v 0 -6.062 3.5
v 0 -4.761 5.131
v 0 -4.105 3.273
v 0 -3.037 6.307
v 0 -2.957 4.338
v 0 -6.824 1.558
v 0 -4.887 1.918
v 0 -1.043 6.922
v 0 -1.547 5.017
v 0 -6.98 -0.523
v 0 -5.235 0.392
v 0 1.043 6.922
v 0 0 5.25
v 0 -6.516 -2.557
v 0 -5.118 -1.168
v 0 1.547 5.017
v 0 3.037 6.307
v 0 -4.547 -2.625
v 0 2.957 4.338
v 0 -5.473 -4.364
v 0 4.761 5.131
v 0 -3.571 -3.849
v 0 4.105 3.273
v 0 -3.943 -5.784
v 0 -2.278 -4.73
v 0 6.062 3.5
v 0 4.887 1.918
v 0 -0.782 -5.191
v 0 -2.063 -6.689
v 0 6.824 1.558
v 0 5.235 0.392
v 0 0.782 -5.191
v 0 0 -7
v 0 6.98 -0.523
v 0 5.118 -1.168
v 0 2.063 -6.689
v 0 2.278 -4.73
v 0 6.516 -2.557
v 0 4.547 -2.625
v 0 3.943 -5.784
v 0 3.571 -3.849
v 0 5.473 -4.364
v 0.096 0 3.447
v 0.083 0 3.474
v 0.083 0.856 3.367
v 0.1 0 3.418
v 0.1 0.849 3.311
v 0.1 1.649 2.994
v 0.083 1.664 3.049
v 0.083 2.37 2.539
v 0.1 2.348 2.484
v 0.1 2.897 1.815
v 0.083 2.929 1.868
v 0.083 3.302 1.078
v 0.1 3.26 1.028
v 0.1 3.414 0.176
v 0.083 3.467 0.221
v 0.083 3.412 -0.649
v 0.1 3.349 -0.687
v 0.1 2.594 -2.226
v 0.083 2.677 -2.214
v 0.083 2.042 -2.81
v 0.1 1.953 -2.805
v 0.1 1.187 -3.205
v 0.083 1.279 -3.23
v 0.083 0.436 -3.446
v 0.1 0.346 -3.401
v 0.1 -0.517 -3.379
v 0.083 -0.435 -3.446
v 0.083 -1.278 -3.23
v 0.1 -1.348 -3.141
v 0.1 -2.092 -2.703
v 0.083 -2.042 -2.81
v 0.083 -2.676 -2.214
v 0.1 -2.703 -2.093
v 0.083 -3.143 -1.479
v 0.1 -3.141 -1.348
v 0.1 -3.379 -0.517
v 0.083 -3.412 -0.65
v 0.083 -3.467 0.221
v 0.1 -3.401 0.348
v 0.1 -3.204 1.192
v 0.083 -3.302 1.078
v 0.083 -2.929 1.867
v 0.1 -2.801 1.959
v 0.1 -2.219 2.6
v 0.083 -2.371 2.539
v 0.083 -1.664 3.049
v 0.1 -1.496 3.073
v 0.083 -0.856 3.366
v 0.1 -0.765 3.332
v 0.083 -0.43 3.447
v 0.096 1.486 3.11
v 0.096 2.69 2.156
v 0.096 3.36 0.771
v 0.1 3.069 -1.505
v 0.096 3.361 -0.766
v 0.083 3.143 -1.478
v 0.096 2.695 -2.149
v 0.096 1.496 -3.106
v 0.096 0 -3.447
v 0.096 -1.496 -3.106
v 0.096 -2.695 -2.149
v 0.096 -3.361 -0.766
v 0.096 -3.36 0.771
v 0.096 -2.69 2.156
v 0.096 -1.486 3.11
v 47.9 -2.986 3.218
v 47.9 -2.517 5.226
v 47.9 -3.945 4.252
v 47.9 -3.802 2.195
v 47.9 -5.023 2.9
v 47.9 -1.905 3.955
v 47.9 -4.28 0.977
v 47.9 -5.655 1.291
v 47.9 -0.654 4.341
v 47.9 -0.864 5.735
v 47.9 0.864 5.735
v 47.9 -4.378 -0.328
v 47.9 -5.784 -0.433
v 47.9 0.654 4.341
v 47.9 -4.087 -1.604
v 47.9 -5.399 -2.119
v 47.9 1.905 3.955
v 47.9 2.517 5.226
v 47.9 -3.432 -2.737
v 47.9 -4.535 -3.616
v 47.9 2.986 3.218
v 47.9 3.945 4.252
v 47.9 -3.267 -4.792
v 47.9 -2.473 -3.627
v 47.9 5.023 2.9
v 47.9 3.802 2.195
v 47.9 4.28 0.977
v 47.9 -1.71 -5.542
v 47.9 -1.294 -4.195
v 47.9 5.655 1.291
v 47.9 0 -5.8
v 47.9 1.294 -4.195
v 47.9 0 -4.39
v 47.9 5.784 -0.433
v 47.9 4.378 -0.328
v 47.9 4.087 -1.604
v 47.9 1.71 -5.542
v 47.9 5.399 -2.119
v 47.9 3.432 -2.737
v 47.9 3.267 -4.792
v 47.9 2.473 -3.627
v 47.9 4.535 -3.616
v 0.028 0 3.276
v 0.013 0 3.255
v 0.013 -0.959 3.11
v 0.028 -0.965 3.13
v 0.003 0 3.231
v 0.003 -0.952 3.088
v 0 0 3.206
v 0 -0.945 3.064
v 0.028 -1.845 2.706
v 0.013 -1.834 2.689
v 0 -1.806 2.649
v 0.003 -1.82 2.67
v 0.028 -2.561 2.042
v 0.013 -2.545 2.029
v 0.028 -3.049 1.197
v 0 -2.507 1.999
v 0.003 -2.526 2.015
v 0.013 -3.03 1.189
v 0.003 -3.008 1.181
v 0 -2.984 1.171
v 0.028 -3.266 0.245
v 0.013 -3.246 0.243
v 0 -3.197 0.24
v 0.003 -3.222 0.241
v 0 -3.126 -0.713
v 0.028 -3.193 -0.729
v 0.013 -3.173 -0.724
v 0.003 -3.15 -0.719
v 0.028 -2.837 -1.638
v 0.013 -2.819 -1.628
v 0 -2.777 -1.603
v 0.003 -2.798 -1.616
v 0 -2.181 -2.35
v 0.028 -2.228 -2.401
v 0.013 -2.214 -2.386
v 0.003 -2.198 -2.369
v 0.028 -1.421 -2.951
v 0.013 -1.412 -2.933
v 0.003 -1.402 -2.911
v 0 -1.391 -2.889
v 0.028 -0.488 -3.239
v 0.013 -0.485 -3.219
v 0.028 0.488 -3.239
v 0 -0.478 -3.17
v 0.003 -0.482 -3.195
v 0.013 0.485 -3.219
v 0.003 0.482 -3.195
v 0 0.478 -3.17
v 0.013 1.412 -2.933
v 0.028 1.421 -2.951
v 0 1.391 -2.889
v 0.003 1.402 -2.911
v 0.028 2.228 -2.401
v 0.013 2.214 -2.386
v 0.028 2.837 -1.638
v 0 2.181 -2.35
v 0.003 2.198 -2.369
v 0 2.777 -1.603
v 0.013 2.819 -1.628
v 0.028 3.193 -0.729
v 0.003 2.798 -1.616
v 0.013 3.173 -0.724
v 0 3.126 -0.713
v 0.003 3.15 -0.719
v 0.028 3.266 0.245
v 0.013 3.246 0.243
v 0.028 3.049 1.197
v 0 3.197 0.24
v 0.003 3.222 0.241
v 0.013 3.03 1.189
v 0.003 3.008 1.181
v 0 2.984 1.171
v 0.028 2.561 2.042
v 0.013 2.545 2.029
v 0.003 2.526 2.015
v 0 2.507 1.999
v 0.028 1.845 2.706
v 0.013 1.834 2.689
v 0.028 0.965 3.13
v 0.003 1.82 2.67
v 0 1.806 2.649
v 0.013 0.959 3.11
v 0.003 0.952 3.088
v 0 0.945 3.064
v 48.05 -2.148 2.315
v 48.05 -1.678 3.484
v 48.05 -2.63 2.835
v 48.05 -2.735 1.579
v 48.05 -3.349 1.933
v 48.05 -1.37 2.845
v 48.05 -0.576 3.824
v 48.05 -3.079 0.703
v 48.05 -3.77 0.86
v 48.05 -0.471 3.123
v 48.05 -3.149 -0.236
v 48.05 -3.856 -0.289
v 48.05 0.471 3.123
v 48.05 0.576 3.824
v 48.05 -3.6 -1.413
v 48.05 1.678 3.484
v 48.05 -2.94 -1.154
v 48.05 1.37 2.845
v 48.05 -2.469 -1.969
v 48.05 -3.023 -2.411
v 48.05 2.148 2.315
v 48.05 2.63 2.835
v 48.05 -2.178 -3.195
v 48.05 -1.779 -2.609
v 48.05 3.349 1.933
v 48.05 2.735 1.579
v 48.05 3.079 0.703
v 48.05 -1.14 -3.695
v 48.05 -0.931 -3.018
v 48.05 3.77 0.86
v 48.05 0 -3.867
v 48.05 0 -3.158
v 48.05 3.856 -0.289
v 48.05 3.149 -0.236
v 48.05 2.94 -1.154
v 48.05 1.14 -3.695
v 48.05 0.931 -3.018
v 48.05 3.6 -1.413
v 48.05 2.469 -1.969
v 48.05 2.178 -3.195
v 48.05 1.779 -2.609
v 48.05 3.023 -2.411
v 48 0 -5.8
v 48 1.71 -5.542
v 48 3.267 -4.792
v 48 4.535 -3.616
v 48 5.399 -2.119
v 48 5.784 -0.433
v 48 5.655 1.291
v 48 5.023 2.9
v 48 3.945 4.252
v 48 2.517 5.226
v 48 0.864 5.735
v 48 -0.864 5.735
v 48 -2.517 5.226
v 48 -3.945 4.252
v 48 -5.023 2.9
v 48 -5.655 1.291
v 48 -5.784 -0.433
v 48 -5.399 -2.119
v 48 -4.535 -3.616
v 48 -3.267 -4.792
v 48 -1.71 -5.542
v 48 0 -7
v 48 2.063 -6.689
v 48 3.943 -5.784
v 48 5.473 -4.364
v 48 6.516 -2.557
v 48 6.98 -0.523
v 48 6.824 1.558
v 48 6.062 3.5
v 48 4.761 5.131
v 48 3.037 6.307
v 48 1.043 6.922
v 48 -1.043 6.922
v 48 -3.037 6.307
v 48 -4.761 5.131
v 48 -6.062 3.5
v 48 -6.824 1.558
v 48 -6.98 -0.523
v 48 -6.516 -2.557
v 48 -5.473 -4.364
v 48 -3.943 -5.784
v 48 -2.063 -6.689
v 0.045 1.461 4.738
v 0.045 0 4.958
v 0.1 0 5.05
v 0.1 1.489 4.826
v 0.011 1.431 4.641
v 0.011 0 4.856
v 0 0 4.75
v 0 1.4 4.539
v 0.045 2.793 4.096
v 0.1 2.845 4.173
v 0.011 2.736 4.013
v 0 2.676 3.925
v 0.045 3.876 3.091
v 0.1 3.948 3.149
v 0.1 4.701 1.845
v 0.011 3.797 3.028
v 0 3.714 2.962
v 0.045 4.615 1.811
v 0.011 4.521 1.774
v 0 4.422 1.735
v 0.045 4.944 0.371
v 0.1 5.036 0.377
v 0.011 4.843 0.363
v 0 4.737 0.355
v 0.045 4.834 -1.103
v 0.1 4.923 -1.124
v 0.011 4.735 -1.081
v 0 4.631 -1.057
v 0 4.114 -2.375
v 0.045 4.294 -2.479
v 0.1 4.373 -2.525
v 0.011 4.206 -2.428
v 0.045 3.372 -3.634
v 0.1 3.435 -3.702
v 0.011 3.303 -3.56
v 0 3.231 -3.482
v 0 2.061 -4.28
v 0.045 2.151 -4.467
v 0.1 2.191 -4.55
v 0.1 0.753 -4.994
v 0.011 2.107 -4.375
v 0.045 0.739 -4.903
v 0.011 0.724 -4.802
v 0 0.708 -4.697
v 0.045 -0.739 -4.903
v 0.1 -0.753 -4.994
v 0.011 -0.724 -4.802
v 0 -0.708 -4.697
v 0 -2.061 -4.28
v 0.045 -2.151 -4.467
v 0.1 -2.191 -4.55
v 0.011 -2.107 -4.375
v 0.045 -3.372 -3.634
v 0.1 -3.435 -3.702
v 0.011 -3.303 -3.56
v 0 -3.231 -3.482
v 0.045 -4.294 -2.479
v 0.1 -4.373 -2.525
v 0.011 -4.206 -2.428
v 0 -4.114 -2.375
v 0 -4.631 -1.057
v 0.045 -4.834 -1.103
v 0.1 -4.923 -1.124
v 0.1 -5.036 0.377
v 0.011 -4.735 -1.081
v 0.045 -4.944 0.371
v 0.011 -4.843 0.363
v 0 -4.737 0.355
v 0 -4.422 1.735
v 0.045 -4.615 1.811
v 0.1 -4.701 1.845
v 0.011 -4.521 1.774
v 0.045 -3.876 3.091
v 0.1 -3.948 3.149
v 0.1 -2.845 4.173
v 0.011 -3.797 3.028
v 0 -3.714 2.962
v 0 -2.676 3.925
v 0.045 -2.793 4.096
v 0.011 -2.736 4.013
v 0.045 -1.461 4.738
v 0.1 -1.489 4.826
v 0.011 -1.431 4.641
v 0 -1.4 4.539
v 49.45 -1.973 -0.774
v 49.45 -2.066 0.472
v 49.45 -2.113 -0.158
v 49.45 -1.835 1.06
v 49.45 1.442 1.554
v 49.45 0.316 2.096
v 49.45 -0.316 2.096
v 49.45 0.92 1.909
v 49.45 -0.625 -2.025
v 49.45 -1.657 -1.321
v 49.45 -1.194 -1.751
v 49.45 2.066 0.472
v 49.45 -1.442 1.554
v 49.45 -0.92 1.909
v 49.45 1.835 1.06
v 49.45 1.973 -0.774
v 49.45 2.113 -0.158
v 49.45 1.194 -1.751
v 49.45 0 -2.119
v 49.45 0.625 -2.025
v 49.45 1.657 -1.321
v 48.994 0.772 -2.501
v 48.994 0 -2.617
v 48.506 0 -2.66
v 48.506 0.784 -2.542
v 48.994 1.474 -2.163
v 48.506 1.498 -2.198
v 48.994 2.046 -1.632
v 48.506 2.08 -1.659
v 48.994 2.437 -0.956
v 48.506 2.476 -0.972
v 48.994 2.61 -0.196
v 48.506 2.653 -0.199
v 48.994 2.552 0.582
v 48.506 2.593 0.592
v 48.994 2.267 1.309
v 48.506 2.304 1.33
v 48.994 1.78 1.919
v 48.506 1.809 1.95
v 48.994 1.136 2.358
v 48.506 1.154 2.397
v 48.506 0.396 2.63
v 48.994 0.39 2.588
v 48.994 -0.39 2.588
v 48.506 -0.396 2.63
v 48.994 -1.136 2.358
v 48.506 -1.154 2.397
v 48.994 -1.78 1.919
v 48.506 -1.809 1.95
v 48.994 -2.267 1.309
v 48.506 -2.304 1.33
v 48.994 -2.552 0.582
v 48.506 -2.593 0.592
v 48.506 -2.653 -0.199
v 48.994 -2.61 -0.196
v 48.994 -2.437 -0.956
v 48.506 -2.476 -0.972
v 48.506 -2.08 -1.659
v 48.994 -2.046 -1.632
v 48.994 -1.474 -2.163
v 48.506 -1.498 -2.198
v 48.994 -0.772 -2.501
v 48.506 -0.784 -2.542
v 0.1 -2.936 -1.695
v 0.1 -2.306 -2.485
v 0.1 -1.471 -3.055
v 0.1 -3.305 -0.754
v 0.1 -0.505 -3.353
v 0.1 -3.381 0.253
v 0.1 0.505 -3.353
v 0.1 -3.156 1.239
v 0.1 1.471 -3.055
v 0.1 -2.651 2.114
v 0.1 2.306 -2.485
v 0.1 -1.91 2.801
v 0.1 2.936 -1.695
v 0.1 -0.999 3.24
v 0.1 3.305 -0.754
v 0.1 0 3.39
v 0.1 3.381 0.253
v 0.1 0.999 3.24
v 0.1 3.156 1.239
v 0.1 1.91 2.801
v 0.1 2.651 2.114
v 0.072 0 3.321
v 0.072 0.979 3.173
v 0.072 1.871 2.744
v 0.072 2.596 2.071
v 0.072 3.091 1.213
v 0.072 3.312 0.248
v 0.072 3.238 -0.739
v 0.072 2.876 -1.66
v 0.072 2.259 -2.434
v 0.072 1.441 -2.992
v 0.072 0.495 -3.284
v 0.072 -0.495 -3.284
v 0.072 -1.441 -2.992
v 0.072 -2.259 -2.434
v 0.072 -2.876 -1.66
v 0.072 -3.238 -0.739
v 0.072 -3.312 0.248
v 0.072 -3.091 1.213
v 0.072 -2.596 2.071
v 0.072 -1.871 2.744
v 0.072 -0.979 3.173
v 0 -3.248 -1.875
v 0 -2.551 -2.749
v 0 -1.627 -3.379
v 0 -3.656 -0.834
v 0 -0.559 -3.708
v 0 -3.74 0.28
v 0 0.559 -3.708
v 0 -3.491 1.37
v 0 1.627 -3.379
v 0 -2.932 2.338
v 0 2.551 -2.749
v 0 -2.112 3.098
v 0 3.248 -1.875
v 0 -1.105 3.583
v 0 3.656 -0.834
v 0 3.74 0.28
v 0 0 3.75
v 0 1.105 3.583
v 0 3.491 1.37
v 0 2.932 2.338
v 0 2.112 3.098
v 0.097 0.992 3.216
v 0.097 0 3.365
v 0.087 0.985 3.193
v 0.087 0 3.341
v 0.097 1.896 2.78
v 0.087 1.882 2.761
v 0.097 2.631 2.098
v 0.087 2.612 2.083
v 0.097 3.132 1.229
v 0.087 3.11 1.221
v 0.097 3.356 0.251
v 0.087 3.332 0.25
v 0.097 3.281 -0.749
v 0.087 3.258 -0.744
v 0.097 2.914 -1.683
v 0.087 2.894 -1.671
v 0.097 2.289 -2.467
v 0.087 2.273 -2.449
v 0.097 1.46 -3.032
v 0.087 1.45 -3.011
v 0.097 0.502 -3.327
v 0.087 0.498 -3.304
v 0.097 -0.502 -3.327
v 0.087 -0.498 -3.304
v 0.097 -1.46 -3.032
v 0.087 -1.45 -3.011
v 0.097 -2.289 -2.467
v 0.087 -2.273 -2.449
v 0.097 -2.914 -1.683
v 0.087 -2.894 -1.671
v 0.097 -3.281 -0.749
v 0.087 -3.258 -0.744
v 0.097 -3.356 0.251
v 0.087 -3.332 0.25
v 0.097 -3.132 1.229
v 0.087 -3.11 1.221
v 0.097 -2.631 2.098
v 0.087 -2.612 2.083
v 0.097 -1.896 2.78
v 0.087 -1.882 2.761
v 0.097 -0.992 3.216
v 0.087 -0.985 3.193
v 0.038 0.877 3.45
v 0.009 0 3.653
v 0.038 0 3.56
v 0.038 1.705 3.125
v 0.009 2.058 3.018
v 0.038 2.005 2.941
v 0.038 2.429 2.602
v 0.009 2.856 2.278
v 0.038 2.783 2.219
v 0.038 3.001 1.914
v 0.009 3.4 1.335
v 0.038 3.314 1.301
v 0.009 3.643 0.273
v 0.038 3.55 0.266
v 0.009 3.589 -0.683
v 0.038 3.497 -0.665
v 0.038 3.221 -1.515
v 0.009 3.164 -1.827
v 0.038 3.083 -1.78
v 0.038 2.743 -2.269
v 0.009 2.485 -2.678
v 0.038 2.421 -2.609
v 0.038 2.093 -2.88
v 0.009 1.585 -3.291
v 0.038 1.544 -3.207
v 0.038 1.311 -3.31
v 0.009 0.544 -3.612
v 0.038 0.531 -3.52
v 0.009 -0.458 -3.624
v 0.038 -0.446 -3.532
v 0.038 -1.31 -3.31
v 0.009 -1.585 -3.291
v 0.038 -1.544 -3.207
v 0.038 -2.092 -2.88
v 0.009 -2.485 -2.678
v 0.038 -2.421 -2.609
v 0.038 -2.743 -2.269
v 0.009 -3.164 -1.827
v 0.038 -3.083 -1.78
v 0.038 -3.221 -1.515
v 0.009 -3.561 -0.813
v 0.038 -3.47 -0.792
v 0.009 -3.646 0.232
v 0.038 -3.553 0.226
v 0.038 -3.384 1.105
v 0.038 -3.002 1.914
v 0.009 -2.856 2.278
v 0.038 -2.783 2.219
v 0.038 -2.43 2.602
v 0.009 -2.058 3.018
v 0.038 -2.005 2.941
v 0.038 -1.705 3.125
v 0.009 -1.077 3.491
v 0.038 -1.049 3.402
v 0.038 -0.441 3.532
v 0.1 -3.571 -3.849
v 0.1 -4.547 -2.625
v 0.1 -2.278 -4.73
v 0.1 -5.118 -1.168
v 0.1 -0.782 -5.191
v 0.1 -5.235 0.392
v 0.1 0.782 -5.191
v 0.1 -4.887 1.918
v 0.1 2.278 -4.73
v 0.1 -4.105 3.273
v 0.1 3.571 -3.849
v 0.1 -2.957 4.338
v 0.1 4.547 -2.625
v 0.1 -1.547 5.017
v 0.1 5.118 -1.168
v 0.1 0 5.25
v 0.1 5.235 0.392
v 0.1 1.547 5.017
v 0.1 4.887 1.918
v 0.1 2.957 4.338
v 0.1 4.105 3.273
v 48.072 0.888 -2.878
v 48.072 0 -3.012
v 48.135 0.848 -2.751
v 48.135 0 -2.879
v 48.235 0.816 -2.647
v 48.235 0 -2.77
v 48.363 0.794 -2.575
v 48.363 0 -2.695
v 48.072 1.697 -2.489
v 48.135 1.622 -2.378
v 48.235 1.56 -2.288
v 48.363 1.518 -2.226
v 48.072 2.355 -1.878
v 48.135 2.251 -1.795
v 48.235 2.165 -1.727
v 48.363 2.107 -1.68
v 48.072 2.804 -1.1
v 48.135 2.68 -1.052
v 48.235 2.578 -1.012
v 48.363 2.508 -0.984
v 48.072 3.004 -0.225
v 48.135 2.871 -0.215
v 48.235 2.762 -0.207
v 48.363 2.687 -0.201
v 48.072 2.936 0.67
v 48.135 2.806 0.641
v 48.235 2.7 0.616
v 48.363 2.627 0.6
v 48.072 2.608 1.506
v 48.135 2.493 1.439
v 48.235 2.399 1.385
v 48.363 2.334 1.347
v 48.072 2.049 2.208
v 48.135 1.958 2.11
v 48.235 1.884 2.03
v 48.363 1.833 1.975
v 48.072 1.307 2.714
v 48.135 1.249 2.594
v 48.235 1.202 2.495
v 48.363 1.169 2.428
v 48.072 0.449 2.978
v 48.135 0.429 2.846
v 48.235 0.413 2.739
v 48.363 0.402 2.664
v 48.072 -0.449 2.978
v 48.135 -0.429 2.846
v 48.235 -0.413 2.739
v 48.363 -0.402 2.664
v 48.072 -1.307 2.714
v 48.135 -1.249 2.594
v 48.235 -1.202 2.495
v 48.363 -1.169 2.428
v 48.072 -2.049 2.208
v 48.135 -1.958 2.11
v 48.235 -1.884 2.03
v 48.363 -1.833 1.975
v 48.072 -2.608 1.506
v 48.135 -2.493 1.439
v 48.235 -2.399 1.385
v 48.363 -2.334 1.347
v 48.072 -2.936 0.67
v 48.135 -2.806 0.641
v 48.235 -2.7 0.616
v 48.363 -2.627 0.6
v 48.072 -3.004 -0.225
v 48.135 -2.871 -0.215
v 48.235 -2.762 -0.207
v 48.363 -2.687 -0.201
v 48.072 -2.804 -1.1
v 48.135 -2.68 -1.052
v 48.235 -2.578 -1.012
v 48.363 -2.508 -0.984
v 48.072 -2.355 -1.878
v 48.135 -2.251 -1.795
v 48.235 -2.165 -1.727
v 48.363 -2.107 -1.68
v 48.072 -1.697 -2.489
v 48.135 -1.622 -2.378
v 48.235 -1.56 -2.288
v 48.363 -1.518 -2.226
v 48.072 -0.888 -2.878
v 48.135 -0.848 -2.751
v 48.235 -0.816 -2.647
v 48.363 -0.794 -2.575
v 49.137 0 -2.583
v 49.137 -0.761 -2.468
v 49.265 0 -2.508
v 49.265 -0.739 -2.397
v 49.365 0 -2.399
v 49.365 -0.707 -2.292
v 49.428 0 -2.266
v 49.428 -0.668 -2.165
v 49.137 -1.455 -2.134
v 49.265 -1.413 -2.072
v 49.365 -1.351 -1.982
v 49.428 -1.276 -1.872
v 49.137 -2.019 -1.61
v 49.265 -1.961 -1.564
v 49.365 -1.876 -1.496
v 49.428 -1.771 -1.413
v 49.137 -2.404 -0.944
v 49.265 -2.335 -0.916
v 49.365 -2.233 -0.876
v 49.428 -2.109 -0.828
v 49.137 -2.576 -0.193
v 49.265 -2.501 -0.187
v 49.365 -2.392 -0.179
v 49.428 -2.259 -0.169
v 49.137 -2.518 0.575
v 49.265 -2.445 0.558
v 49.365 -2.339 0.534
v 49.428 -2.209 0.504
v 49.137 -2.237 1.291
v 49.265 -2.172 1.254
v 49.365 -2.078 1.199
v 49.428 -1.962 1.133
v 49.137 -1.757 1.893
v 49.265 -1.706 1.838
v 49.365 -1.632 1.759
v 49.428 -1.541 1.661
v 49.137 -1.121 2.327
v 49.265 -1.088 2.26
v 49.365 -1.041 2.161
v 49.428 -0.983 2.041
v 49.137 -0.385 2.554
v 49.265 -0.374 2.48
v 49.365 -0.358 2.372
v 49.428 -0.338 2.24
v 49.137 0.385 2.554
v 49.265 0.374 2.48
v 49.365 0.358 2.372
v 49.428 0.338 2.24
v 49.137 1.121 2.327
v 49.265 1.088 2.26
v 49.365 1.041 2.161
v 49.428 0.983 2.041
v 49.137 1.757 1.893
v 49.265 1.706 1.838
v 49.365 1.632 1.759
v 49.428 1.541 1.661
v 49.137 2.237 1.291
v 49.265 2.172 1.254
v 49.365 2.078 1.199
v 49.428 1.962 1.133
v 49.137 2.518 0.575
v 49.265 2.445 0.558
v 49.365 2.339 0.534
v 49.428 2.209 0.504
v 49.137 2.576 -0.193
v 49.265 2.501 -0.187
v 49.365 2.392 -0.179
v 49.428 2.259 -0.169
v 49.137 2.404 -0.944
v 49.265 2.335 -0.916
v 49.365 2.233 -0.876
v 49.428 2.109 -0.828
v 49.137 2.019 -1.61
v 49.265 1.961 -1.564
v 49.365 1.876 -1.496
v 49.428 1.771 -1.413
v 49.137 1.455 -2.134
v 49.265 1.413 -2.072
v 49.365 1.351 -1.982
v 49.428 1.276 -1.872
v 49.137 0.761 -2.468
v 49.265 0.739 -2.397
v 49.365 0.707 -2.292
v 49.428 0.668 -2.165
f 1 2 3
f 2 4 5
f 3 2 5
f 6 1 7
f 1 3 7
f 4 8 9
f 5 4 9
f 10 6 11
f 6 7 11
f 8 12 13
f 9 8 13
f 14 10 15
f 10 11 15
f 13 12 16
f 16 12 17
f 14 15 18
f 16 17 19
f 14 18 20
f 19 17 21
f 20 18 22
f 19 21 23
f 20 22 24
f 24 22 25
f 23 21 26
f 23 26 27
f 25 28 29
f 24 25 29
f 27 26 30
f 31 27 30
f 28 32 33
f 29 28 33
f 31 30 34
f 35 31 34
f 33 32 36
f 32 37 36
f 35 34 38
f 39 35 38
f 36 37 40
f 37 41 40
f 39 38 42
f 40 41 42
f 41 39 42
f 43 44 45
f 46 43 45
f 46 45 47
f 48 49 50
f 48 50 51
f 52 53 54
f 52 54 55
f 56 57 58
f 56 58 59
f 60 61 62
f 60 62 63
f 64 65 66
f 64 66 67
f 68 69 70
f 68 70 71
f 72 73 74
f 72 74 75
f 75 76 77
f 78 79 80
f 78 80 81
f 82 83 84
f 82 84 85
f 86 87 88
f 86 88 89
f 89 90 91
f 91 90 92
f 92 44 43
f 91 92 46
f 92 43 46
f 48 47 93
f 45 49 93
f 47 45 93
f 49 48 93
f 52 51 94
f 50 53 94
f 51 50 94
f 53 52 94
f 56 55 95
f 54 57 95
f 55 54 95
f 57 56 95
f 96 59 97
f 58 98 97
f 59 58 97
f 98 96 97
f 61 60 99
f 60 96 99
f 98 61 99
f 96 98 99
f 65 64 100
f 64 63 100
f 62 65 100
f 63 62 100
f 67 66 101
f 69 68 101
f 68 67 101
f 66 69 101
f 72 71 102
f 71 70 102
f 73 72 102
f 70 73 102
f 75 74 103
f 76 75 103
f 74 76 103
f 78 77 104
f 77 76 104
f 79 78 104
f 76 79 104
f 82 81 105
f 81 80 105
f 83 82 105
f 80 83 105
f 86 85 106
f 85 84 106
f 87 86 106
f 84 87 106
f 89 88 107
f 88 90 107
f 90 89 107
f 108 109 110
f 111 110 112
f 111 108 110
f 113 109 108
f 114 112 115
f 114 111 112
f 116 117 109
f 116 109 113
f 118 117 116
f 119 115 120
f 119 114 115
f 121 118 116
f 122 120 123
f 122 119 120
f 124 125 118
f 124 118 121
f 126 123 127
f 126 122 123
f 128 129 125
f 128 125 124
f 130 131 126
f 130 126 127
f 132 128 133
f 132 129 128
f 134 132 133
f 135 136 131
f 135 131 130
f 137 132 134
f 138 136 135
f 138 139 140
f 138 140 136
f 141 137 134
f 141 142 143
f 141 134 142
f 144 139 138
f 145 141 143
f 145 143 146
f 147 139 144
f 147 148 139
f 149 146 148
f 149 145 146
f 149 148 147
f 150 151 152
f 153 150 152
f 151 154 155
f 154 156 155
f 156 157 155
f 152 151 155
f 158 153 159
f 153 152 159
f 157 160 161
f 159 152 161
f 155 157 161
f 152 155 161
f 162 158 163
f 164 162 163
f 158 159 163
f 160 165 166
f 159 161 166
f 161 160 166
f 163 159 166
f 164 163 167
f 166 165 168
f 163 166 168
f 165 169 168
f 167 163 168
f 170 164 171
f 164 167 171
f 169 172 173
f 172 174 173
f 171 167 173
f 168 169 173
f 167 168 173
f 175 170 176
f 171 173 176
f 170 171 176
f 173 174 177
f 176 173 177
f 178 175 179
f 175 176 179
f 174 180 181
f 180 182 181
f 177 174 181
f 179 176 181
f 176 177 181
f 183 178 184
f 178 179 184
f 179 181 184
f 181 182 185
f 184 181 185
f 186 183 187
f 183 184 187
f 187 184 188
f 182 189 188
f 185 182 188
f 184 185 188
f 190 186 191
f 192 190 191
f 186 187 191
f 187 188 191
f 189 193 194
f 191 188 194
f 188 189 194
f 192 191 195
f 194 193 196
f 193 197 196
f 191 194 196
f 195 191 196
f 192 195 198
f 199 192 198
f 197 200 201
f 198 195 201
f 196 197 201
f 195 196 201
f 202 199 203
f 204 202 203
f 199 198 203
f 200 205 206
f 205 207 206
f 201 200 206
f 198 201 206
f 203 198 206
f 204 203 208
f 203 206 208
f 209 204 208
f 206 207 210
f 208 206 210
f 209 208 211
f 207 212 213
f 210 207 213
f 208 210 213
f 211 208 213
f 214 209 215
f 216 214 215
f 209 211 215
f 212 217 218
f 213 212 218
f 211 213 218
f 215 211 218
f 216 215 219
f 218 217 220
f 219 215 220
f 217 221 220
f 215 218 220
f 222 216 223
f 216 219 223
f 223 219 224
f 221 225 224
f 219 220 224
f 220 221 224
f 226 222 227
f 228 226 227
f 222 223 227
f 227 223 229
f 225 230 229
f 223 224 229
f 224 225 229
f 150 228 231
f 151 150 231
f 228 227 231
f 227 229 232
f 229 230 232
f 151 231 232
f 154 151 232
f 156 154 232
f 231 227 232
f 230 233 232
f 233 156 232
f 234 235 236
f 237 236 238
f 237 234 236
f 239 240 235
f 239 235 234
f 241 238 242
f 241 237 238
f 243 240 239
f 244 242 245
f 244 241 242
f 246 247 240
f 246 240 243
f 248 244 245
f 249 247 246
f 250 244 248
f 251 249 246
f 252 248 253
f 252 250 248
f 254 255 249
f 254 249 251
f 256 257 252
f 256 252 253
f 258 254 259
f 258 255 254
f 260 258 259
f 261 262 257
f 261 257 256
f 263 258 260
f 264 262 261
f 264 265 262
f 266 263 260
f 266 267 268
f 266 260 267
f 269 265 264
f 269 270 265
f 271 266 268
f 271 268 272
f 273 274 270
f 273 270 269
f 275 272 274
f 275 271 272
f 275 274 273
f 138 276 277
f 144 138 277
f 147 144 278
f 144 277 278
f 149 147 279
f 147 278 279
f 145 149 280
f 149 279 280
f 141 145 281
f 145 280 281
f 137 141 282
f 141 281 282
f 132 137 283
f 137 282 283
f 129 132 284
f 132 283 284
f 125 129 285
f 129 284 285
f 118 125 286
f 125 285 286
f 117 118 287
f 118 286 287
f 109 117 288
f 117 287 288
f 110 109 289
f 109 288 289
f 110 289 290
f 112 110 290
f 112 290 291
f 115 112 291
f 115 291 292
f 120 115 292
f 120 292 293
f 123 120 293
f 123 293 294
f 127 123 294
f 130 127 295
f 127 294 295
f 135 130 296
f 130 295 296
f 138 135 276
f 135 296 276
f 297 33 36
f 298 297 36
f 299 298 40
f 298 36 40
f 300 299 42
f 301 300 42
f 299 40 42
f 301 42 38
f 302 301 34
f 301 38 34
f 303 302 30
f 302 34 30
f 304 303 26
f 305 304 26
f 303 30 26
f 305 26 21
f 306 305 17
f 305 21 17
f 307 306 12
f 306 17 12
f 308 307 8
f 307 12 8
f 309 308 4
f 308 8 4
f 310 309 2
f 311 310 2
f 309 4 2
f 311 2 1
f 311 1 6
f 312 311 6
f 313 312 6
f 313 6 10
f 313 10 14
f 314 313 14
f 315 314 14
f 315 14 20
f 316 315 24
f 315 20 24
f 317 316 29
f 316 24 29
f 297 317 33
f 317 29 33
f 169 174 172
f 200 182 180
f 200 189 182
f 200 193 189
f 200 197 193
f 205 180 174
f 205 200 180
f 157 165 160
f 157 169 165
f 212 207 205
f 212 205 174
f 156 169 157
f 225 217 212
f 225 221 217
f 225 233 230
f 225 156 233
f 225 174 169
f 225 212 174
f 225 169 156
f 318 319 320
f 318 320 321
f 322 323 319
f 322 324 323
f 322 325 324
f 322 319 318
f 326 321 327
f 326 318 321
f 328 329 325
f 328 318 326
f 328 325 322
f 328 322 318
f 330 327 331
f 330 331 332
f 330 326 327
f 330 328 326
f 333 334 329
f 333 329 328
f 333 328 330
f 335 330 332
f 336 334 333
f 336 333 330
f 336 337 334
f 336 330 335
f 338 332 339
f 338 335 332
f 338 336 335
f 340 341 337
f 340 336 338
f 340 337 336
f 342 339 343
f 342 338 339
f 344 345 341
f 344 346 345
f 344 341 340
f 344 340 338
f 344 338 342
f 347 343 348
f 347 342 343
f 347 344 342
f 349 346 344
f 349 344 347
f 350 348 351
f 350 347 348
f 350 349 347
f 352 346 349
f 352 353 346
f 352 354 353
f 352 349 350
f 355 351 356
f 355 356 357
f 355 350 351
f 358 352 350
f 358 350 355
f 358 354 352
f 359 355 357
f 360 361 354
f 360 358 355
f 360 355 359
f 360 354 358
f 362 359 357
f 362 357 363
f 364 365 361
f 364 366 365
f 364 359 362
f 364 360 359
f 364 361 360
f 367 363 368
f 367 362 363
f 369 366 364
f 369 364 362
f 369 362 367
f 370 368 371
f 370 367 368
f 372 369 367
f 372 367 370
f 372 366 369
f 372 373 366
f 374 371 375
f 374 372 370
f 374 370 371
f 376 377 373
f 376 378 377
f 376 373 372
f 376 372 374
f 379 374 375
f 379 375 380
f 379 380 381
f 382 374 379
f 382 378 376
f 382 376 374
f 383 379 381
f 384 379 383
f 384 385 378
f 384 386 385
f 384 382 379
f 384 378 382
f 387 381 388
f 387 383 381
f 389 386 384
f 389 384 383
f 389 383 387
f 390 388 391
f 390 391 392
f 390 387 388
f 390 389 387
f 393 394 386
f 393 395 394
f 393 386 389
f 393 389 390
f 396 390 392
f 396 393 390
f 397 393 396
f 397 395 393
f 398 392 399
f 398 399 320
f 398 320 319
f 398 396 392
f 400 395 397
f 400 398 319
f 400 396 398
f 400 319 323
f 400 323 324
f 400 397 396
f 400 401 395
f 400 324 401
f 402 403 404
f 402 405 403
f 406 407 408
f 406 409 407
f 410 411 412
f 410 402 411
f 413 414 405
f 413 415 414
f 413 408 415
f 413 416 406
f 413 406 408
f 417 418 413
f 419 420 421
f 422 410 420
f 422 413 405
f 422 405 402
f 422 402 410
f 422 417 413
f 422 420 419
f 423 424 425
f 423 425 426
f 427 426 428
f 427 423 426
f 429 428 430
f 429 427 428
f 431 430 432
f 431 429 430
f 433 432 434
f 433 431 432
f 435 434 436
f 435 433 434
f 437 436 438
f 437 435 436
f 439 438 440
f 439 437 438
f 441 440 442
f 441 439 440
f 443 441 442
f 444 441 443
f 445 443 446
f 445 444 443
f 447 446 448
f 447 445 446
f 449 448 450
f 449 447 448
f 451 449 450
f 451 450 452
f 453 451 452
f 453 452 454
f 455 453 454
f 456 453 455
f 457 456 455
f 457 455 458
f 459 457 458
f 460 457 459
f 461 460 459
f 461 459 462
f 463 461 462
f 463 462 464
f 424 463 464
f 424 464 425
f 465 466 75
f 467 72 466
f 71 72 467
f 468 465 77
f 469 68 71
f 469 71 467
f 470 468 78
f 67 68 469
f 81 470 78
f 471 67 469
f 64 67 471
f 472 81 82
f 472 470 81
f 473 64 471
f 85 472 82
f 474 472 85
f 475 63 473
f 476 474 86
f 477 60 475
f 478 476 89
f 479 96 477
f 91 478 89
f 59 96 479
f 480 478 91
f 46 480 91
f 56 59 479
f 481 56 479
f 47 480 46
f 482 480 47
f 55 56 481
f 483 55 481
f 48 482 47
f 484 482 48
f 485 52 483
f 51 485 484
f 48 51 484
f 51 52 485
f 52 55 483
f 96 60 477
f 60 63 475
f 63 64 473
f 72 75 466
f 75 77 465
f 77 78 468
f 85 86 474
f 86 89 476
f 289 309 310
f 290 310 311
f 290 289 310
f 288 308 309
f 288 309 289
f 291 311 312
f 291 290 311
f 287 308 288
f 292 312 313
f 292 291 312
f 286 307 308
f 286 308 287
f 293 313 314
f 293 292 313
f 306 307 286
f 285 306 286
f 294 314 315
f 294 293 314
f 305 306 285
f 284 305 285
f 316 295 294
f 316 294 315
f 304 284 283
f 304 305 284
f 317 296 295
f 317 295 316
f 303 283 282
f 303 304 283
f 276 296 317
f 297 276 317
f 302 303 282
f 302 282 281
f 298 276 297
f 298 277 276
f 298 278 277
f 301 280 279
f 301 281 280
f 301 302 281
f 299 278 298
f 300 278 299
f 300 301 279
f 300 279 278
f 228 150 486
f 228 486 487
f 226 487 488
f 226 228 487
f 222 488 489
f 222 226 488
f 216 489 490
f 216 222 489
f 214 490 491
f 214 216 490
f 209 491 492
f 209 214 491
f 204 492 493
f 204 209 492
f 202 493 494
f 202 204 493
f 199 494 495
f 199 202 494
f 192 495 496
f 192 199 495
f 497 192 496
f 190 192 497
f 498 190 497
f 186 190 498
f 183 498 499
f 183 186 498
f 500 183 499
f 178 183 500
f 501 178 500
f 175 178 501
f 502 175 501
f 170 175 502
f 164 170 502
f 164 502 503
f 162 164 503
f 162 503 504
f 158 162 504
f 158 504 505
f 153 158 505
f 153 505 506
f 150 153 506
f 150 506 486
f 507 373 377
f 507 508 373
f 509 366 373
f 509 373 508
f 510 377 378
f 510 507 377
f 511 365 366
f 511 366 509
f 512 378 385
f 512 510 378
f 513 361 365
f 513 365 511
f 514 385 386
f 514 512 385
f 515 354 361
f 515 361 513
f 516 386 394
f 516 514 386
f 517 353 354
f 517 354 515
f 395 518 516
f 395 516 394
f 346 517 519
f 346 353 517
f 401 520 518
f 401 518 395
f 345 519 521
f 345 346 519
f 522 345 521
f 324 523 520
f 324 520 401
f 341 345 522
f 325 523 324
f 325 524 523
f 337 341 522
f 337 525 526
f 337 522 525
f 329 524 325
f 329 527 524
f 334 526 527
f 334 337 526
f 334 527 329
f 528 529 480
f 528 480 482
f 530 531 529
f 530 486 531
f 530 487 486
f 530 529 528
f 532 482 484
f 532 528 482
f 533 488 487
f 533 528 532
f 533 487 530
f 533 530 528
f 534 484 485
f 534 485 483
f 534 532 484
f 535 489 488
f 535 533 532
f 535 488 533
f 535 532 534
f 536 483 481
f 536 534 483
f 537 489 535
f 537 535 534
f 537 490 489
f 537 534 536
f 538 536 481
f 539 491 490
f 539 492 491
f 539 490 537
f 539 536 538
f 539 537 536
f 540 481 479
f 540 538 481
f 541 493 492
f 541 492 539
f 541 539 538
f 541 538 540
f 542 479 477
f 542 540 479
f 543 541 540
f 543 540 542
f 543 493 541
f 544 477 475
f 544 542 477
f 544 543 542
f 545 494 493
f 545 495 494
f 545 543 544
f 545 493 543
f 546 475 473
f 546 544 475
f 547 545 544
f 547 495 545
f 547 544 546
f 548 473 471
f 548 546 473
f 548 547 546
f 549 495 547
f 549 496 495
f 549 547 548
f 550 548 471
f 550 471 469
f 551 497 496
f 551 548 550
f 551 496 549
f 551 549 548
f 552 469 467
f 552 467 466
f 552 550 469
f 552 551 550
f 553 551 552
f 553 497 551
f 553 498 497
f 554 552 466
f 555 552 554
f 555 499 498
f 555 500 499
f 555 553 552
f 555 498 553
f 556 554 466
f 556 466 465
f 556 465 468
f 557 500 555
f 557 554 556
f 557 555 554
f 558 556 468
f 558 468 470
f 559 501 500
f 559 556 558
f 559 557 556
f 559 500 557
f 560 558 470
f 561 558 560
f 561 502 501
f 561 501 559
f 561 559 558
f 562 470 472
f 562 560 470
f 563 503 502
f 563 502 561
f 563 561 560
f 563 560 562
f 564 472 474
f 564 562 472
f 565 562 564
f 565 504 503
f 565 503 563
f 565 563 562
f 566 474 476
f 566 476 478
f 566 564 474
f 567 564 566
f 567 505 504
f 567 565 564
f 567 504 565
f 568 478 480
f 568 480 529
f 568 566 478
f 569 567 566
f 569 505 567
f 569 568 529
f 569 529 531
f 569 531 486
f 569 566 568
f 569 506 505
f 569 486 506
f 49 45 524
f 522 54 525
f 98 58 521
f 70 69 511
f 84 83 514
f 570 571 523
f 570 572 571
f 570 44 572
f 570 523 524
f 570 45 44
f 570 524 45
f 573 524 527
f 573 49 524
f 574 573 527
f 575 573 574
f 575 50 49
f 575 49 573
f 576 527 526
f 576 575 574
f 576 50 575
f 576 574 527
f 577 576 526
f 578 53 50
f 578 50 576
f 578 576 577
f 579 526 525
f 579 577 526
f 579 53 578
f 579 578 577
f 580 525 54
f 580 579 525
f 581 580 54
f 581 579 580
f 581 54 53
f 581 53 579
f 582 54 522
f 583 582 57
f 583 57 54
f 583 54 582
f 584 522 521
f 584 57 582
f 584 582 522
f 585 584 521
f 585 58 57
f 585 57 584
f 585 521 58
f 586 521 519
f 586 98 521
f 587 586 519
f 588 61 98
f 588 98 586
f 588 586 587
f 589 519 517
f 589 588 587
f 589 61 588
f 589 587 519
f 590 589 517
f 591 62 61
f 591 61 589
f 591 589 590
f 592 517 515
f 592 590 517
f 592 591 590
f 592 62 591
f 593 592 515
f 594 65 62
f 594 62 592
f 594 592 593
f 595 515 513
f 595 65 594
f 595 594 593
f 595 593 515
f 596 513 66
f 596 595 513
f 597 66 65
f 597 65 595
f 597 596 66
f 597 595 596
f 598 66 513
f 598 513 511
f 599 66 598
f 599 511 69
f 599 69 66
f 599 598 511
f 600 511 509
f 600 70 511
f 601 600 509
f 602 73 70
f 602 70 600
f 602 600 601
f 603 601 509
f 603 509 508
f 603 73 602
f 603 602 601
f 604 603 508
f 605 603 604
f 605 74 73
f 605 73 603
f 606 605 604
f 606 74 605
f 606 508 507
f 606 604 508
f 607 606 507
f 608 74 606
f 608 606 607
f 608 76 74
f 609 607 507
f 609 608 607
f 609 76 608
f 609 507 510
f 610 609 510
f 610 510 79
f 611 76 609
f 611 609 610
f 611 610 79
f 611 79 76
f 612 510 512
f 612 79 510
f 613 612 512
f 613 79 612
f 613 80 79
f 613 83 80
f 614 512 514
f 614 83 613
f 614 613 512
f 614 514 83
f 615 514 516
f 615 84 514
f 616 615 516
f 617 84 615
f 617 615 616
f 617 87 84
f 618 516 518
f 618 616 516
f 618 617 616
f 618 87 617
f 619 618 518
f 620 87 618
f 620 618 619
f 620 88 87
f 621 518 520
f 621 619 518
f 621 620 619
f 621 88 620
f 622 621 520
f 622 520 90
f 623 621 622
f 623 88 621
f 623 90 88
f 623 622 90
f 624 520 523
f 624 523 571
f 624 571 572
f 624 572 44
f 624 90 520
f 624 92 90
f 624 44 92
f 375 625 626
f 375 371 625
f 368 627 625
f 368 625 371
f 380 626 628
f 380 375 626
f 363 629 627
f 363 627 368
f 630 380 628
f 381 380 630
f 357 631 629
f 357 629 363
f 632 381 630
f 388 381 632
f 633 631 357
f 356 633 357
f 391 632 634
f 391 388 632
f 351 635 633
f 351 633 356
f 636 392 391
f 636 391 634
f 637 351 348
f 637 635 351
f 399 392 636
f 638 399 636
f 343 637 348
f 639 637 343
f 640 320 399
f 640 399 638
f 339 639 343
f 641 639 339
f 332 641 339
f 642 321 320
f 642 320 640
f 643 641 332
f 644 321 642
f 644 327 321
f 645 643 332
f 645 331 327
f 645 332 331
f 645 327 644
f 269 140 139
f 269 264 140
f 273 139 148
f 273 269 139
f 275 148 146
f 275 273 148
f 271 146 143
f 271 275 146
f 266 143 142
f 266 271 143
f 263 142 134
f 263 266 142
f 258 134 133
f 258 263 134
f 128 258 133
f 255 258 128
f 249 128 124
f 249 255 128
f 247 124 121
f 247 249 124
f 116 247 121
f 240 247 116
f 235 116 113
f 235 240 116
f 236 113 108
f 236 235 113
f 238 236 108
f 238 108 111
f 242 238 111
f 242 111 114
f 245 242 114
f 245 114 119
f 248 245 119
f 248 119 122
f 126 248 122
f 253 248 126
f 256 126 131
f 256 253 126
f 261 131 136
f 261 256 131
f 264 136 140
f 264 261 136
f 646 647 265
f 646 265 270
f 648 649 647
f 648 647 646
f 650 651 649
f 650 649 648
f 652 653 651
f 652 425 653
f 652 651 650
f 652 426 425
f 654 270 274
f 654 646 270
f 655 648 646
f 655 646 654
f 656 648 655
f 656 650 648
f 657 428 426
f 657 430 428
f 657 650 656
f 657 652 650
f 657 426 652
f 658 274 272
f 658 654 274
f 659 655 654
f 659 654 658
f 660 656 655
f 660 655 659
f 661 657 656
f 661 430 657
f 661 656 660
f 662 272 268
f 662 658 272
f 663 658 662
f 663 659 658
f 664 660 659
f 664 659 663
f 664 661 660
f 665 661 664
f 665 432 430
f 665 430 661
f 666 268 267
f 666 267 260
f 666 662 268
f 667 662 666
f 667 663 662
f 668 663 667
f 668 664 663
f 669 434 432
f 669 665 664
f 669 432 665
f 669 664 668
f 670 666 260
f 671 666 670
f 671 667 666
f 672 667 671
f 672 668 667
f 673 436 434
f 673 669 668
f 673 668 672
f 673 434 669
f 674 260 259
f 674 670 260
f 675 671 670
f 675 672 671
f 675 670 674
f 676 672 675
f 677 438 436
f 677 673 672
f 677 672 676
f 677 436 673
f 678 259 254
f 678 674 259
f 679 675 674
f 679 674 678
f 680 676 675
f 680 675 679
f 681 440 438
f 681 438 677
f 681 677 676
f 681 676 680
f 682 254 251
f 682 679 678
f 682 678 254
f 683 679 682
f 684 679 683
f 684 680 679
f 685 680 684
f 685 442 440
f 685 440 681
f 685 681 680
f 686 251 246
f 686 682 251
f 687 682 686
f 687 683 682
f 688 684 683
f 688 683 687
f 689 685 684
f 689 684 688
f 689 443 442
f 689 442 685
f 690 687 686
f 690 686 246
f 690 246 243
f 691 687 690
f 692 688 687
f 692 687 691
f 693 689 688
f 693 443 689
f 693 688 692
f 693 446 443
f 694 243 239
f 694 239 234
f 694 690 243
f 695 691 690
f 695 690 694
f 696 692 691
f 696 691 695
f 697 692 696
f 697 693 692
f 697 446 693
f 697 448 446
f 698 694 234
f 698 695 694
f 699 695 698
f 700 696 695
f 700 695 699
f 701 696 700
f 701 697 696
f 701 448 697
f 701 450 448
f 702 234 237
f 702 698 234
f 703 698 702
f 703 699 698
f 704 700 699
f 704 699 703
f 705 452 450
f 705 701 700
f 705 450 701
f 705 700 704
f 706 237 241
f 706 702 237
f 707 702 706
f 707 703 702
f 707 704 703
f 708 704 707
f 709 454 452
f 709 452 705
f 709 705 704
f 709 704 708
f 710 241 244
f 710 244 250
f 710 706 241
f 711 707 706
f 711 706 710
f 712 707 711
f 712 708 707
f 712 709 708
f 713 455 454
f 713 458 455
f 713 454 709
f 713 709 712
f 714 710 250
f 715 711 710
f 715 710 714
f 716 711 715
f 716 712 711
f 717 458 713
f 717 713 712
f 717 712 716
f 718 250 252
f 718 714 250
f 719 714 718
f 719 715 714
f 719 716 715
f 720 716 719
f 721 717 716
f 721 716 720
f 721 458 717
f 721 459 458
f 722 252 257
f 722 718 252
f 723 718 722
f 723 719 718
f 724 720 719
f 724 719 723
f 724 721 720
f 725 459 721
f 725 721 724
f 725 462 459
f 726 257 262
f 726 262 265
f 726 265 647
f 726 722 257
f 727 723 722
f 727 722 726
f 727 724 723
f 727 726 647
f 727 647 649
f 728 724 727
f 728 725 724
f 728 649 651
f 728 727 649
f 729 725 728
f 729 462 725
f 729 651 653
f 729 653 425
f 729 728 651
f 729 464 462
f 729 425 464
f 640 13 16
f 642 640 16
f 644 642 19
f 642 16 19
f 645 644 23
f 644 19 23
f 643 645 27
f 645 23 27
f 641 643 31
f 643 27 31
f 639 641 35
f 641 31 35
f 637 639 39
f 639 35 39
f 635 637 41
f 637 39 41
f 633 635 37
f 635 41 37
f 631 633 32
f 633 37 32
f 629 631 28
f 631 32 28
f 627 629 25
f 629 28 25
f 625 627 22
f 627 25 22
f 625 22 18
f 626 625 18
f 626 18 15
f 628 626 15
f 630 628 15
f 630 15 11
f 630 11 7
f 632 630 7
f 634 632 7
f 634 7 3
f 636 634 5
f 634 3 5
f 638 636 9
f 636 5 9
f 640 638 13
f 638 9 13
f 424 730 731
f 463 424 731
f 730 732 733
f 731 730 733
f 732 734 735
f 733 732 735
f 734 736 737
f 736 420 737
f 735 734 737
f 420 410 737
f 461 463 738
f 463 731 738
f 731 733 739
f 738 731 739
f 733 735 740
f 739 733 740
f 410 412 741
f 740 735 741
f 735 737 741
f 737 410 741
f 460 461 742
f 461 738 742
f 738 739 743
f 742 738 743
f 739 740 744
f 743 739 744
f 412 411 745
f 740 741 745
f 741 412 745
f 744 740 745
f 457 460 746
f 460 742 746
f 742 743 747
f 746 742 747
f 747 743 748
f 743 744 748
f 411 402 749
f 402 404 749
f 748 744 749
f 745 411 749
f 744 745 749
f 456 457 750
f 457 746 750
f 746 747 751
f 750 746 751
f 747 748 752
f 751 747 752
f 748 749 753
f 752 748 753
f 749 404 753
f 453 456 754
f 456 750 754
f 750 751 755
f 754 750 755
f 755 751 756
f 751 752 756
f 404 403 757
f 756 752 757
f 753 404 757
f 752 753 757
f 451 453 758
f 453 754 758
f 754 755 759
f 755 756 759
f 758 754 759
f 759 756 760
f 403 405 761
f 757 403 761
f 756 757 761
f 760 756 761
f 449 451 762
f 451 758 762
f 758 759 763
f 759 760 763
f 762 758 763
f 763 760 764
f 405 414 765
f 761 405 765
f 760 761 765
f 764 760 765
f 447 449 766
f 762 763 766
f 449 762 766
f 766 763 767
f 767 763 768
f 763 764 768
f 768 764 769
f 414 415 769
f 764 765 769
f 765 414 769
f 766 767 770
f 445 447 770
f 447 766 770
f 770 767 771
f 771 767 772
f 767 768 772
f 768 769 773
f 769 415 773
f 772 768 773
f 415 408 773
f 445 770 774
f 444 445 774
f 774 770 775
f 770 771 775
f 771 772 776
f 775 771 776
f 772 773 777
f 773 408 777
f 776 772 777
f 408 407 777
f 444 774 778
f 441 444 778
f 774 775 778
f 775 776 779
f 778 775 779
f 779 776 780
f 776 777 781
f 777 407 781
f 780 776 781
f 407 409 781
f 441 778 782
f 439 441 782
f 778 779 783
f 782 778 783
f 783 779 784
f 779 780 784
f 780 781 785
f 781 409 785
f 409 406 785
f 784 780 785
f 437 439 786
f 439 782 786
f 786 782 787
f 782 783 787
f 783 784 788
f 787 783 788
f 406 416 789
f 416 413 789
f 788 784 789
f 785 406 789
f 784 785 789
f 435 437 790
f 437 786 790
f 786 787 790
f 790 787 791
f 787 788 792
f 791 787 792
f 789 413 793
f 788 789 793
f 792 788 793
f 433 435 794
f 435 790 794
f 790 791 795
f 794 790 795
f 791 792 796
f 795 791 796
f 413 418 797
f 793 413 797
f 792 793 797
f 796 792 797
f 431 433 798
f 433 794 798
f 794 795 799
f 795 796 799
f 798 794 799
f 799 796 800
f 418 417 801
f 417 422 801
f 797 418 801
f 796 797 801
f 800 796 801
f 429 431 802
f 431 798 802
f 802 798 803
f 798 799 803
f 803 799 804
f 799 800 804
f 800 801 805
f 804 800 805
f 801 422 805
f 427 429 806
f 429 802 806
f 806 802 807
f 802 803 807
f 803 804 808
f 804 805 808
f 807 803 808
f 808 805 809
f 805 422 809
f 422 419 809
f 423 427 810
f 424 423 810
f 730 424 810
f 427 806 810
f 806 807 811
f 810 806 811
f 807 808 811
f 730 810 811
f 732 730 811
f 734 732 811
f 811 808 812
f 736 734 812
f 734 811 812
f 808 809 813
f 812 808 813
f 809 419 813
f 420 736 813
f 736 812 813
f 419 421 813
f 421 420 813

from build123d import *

# Parameters (mm, degrees)
SKETCH1_R           = 7
BOSS_EXTRUDE1_DEPTH = 48
SKETCH2_R           = 5.8
CUT_EXTRUDE1_DEPTH  = 0.1
SKETCH3_R           = 5.25
CUT_EXTRUDE2_DEPTH  = 0.1
SKETCH4_R           = 5.05
SKETCH4_R_2         = 3.45
BOSS_EXTRUDE2_DEPTH = 0.1
FILLET1_R           = 0.5
SKETCH5_R           = 3.35
BOSS_EXTRUDE3_DEPTH = 0.1
BOSS_EXTRUDE3_TAPER = 46
FILLET4_R           = 0.1
SKETCH6_R           = 4.39
BOSS_EXTRUDE4_DEPTH = 0.15
BOSS_EXTRUDE4_TAPER = 74
SKETCH7_R           = 2.7
BOSS_EXTRUDE5_DEPTH = 1.4
BOSS_EXTRUDE5_TAPER = 5
FILLET5_R           = 0.5
FILLET6_R           = 0.5


with BuildPart() as part:
    # Sketch1 → Boss-Extrude1 (new body)
    with BuildSketch(Plane(origin=(0, 0, 0), x_dir=(0, 0, -1), z_dir=(1, 0, 0))):
        Circle(SKETCH1_R)
    extrude(amount=BOSS_EXTRUDE1_DEPTH)

    # Sketch2 → Cut-Extrude1 (cut)
    with BuildSketch(Plane(origin=(48, 0, 0), x_dir=(0, 0, -1), z_dir=(1, 0, 0))):
        Circle(SKETCH2_R)
    extrude(amount=-CUT_EXTRUDE1_DEPTH, mode=Mode.SUBTRACT)

    # Sketch3 → Cut-Extrude2 (cut)
    with BuildSketch(Plane.ZY):
        Circle(SKETCH3_R)
    extrude(amount=-CUT_EXTRUDE2_DEPTH, mode=Mode.SUBTRACT)

    # Sketch4 → Boss-Extrude2 (add)
    with BuildSketch(Plane.ZY.offset(-0.1)):
        Circle(SKETCH4_R)
        Circle(SKETCH4_R_2, mode=Mode.SUBTRACT)
    extrude(amount=BOSS_EXTRUDE2_DEPTH)

    # Fillet1
    # the kernel refuses this fillet: 0.5 mm, written as the material it takes off along each edge
    with BuildSketch(Plane(origin=(0, 0, 0), x_dir=(0, 0, 1), z_dir=(0, -1, 0))) as fillet1_piece_1:
        with BuildLine():
            CenterArc((4.75, -0.5), FILLET1_R, 53.130102354, 36.869897646)
            Line((4.75, 0), (4.75, 0.01))
            Line((4.75, 0.01), (5.05, 0.01))
            Line((5.05, 0.01), (5.06, 0))
            ThreePointArc((5.06, 0), (5.06, -0.05), (5.056, -0.092))
            Line((5.056, -0.092), (5.05, -0.1))
        make_face()
    revolve(axis=Axis((0, 0, 0), (-1, 0, 0)), mode=Mode.SUBTRACT)
    with BuildSketch(Plane(origin=(0, 0, 0), x_dir=(0, 0, 1), z_dir=(0, -1, 0))) as fillet1_piece_2:
        with BuildLine():
            CenterArc((3.75, -0.5), FILLET1_R, 90, 36.869897646)
            Line((3.45, -0.1), (3.444, -0.092))
            ThreePointArc((3.444, -0.092), (3.44, -0.05), (3.44, 0))
            Line((3.44, 0), (3.45, 0.01))
            Line((3.45, 0.01), (3.75, 0.01))
            Line((3.75, 0.01), (3.75, 0))
        make_face()
    revolve(axis=Axis((0, 0, 0), (-1, 0, 0)), mode=Mode.SUBTRACT)

    # Sketch5 → Boss-Extrude3 (add)
    with BuildSketch(Plane.ZY.offset(-0.1)):
        Circle(SKETCH5_R)
    extrude(amount=BOSS_EXTRUDE3_DEPTH, taper=BOSS_EXTRUDE3_TAPER)

    # Fillet4
    fillet4_edges = [part.edges().sort_by_distance(p)[0] for p in [
        (0.1, 0, -3.45),
        (0.1, 0, -3.35),
        (0, 0, -3.246446969),
    ]]
    fillet(fillet4_edges, radius=FILLET4_R)

    # Sketch6 → Boss-Extrude4 (add)
    with BuildSketch(Plane(origin=(47.9, 0, 0), x_dir=(0, 0, -1), z_dir=(1, 0, 0))):
        Circle(SKETCH6_R)
    extrude(amount=BOSS_EXTRUDE4_DEPTH, taper=BOSS_EXTRUDE4_TAPER)

    # Sketch7 → Boss-Extrude5 (add)
    with BuildSketch(Plane(origin=(48.05, 0, 0), x_dir=(0, 0, -1), z_dir=(1, 0, 0))):
        Circle(SKETCH7_R)
    extrude(amount=BOSS_EXTRUDE5_DEPTH, taper=BOSS_EXTRUDE5_TAPER)

    # Fillet5
    fillet5_edges = [part.edges().sort_by_distance(p)[0] for p in [
        (48.05, 0, 2.7),
    ]]
    fillet(fillet5_edges, radius=FILLET5_R)

    # Fillet6
    fillet6_edges = [part.edges().sort_by_distance(p)[0] for p in [
        (49.45, 0, 2.577515871),
    ]]
    fillet(fillet6_edges, radius=FILLET6_R)


solid = part.part
